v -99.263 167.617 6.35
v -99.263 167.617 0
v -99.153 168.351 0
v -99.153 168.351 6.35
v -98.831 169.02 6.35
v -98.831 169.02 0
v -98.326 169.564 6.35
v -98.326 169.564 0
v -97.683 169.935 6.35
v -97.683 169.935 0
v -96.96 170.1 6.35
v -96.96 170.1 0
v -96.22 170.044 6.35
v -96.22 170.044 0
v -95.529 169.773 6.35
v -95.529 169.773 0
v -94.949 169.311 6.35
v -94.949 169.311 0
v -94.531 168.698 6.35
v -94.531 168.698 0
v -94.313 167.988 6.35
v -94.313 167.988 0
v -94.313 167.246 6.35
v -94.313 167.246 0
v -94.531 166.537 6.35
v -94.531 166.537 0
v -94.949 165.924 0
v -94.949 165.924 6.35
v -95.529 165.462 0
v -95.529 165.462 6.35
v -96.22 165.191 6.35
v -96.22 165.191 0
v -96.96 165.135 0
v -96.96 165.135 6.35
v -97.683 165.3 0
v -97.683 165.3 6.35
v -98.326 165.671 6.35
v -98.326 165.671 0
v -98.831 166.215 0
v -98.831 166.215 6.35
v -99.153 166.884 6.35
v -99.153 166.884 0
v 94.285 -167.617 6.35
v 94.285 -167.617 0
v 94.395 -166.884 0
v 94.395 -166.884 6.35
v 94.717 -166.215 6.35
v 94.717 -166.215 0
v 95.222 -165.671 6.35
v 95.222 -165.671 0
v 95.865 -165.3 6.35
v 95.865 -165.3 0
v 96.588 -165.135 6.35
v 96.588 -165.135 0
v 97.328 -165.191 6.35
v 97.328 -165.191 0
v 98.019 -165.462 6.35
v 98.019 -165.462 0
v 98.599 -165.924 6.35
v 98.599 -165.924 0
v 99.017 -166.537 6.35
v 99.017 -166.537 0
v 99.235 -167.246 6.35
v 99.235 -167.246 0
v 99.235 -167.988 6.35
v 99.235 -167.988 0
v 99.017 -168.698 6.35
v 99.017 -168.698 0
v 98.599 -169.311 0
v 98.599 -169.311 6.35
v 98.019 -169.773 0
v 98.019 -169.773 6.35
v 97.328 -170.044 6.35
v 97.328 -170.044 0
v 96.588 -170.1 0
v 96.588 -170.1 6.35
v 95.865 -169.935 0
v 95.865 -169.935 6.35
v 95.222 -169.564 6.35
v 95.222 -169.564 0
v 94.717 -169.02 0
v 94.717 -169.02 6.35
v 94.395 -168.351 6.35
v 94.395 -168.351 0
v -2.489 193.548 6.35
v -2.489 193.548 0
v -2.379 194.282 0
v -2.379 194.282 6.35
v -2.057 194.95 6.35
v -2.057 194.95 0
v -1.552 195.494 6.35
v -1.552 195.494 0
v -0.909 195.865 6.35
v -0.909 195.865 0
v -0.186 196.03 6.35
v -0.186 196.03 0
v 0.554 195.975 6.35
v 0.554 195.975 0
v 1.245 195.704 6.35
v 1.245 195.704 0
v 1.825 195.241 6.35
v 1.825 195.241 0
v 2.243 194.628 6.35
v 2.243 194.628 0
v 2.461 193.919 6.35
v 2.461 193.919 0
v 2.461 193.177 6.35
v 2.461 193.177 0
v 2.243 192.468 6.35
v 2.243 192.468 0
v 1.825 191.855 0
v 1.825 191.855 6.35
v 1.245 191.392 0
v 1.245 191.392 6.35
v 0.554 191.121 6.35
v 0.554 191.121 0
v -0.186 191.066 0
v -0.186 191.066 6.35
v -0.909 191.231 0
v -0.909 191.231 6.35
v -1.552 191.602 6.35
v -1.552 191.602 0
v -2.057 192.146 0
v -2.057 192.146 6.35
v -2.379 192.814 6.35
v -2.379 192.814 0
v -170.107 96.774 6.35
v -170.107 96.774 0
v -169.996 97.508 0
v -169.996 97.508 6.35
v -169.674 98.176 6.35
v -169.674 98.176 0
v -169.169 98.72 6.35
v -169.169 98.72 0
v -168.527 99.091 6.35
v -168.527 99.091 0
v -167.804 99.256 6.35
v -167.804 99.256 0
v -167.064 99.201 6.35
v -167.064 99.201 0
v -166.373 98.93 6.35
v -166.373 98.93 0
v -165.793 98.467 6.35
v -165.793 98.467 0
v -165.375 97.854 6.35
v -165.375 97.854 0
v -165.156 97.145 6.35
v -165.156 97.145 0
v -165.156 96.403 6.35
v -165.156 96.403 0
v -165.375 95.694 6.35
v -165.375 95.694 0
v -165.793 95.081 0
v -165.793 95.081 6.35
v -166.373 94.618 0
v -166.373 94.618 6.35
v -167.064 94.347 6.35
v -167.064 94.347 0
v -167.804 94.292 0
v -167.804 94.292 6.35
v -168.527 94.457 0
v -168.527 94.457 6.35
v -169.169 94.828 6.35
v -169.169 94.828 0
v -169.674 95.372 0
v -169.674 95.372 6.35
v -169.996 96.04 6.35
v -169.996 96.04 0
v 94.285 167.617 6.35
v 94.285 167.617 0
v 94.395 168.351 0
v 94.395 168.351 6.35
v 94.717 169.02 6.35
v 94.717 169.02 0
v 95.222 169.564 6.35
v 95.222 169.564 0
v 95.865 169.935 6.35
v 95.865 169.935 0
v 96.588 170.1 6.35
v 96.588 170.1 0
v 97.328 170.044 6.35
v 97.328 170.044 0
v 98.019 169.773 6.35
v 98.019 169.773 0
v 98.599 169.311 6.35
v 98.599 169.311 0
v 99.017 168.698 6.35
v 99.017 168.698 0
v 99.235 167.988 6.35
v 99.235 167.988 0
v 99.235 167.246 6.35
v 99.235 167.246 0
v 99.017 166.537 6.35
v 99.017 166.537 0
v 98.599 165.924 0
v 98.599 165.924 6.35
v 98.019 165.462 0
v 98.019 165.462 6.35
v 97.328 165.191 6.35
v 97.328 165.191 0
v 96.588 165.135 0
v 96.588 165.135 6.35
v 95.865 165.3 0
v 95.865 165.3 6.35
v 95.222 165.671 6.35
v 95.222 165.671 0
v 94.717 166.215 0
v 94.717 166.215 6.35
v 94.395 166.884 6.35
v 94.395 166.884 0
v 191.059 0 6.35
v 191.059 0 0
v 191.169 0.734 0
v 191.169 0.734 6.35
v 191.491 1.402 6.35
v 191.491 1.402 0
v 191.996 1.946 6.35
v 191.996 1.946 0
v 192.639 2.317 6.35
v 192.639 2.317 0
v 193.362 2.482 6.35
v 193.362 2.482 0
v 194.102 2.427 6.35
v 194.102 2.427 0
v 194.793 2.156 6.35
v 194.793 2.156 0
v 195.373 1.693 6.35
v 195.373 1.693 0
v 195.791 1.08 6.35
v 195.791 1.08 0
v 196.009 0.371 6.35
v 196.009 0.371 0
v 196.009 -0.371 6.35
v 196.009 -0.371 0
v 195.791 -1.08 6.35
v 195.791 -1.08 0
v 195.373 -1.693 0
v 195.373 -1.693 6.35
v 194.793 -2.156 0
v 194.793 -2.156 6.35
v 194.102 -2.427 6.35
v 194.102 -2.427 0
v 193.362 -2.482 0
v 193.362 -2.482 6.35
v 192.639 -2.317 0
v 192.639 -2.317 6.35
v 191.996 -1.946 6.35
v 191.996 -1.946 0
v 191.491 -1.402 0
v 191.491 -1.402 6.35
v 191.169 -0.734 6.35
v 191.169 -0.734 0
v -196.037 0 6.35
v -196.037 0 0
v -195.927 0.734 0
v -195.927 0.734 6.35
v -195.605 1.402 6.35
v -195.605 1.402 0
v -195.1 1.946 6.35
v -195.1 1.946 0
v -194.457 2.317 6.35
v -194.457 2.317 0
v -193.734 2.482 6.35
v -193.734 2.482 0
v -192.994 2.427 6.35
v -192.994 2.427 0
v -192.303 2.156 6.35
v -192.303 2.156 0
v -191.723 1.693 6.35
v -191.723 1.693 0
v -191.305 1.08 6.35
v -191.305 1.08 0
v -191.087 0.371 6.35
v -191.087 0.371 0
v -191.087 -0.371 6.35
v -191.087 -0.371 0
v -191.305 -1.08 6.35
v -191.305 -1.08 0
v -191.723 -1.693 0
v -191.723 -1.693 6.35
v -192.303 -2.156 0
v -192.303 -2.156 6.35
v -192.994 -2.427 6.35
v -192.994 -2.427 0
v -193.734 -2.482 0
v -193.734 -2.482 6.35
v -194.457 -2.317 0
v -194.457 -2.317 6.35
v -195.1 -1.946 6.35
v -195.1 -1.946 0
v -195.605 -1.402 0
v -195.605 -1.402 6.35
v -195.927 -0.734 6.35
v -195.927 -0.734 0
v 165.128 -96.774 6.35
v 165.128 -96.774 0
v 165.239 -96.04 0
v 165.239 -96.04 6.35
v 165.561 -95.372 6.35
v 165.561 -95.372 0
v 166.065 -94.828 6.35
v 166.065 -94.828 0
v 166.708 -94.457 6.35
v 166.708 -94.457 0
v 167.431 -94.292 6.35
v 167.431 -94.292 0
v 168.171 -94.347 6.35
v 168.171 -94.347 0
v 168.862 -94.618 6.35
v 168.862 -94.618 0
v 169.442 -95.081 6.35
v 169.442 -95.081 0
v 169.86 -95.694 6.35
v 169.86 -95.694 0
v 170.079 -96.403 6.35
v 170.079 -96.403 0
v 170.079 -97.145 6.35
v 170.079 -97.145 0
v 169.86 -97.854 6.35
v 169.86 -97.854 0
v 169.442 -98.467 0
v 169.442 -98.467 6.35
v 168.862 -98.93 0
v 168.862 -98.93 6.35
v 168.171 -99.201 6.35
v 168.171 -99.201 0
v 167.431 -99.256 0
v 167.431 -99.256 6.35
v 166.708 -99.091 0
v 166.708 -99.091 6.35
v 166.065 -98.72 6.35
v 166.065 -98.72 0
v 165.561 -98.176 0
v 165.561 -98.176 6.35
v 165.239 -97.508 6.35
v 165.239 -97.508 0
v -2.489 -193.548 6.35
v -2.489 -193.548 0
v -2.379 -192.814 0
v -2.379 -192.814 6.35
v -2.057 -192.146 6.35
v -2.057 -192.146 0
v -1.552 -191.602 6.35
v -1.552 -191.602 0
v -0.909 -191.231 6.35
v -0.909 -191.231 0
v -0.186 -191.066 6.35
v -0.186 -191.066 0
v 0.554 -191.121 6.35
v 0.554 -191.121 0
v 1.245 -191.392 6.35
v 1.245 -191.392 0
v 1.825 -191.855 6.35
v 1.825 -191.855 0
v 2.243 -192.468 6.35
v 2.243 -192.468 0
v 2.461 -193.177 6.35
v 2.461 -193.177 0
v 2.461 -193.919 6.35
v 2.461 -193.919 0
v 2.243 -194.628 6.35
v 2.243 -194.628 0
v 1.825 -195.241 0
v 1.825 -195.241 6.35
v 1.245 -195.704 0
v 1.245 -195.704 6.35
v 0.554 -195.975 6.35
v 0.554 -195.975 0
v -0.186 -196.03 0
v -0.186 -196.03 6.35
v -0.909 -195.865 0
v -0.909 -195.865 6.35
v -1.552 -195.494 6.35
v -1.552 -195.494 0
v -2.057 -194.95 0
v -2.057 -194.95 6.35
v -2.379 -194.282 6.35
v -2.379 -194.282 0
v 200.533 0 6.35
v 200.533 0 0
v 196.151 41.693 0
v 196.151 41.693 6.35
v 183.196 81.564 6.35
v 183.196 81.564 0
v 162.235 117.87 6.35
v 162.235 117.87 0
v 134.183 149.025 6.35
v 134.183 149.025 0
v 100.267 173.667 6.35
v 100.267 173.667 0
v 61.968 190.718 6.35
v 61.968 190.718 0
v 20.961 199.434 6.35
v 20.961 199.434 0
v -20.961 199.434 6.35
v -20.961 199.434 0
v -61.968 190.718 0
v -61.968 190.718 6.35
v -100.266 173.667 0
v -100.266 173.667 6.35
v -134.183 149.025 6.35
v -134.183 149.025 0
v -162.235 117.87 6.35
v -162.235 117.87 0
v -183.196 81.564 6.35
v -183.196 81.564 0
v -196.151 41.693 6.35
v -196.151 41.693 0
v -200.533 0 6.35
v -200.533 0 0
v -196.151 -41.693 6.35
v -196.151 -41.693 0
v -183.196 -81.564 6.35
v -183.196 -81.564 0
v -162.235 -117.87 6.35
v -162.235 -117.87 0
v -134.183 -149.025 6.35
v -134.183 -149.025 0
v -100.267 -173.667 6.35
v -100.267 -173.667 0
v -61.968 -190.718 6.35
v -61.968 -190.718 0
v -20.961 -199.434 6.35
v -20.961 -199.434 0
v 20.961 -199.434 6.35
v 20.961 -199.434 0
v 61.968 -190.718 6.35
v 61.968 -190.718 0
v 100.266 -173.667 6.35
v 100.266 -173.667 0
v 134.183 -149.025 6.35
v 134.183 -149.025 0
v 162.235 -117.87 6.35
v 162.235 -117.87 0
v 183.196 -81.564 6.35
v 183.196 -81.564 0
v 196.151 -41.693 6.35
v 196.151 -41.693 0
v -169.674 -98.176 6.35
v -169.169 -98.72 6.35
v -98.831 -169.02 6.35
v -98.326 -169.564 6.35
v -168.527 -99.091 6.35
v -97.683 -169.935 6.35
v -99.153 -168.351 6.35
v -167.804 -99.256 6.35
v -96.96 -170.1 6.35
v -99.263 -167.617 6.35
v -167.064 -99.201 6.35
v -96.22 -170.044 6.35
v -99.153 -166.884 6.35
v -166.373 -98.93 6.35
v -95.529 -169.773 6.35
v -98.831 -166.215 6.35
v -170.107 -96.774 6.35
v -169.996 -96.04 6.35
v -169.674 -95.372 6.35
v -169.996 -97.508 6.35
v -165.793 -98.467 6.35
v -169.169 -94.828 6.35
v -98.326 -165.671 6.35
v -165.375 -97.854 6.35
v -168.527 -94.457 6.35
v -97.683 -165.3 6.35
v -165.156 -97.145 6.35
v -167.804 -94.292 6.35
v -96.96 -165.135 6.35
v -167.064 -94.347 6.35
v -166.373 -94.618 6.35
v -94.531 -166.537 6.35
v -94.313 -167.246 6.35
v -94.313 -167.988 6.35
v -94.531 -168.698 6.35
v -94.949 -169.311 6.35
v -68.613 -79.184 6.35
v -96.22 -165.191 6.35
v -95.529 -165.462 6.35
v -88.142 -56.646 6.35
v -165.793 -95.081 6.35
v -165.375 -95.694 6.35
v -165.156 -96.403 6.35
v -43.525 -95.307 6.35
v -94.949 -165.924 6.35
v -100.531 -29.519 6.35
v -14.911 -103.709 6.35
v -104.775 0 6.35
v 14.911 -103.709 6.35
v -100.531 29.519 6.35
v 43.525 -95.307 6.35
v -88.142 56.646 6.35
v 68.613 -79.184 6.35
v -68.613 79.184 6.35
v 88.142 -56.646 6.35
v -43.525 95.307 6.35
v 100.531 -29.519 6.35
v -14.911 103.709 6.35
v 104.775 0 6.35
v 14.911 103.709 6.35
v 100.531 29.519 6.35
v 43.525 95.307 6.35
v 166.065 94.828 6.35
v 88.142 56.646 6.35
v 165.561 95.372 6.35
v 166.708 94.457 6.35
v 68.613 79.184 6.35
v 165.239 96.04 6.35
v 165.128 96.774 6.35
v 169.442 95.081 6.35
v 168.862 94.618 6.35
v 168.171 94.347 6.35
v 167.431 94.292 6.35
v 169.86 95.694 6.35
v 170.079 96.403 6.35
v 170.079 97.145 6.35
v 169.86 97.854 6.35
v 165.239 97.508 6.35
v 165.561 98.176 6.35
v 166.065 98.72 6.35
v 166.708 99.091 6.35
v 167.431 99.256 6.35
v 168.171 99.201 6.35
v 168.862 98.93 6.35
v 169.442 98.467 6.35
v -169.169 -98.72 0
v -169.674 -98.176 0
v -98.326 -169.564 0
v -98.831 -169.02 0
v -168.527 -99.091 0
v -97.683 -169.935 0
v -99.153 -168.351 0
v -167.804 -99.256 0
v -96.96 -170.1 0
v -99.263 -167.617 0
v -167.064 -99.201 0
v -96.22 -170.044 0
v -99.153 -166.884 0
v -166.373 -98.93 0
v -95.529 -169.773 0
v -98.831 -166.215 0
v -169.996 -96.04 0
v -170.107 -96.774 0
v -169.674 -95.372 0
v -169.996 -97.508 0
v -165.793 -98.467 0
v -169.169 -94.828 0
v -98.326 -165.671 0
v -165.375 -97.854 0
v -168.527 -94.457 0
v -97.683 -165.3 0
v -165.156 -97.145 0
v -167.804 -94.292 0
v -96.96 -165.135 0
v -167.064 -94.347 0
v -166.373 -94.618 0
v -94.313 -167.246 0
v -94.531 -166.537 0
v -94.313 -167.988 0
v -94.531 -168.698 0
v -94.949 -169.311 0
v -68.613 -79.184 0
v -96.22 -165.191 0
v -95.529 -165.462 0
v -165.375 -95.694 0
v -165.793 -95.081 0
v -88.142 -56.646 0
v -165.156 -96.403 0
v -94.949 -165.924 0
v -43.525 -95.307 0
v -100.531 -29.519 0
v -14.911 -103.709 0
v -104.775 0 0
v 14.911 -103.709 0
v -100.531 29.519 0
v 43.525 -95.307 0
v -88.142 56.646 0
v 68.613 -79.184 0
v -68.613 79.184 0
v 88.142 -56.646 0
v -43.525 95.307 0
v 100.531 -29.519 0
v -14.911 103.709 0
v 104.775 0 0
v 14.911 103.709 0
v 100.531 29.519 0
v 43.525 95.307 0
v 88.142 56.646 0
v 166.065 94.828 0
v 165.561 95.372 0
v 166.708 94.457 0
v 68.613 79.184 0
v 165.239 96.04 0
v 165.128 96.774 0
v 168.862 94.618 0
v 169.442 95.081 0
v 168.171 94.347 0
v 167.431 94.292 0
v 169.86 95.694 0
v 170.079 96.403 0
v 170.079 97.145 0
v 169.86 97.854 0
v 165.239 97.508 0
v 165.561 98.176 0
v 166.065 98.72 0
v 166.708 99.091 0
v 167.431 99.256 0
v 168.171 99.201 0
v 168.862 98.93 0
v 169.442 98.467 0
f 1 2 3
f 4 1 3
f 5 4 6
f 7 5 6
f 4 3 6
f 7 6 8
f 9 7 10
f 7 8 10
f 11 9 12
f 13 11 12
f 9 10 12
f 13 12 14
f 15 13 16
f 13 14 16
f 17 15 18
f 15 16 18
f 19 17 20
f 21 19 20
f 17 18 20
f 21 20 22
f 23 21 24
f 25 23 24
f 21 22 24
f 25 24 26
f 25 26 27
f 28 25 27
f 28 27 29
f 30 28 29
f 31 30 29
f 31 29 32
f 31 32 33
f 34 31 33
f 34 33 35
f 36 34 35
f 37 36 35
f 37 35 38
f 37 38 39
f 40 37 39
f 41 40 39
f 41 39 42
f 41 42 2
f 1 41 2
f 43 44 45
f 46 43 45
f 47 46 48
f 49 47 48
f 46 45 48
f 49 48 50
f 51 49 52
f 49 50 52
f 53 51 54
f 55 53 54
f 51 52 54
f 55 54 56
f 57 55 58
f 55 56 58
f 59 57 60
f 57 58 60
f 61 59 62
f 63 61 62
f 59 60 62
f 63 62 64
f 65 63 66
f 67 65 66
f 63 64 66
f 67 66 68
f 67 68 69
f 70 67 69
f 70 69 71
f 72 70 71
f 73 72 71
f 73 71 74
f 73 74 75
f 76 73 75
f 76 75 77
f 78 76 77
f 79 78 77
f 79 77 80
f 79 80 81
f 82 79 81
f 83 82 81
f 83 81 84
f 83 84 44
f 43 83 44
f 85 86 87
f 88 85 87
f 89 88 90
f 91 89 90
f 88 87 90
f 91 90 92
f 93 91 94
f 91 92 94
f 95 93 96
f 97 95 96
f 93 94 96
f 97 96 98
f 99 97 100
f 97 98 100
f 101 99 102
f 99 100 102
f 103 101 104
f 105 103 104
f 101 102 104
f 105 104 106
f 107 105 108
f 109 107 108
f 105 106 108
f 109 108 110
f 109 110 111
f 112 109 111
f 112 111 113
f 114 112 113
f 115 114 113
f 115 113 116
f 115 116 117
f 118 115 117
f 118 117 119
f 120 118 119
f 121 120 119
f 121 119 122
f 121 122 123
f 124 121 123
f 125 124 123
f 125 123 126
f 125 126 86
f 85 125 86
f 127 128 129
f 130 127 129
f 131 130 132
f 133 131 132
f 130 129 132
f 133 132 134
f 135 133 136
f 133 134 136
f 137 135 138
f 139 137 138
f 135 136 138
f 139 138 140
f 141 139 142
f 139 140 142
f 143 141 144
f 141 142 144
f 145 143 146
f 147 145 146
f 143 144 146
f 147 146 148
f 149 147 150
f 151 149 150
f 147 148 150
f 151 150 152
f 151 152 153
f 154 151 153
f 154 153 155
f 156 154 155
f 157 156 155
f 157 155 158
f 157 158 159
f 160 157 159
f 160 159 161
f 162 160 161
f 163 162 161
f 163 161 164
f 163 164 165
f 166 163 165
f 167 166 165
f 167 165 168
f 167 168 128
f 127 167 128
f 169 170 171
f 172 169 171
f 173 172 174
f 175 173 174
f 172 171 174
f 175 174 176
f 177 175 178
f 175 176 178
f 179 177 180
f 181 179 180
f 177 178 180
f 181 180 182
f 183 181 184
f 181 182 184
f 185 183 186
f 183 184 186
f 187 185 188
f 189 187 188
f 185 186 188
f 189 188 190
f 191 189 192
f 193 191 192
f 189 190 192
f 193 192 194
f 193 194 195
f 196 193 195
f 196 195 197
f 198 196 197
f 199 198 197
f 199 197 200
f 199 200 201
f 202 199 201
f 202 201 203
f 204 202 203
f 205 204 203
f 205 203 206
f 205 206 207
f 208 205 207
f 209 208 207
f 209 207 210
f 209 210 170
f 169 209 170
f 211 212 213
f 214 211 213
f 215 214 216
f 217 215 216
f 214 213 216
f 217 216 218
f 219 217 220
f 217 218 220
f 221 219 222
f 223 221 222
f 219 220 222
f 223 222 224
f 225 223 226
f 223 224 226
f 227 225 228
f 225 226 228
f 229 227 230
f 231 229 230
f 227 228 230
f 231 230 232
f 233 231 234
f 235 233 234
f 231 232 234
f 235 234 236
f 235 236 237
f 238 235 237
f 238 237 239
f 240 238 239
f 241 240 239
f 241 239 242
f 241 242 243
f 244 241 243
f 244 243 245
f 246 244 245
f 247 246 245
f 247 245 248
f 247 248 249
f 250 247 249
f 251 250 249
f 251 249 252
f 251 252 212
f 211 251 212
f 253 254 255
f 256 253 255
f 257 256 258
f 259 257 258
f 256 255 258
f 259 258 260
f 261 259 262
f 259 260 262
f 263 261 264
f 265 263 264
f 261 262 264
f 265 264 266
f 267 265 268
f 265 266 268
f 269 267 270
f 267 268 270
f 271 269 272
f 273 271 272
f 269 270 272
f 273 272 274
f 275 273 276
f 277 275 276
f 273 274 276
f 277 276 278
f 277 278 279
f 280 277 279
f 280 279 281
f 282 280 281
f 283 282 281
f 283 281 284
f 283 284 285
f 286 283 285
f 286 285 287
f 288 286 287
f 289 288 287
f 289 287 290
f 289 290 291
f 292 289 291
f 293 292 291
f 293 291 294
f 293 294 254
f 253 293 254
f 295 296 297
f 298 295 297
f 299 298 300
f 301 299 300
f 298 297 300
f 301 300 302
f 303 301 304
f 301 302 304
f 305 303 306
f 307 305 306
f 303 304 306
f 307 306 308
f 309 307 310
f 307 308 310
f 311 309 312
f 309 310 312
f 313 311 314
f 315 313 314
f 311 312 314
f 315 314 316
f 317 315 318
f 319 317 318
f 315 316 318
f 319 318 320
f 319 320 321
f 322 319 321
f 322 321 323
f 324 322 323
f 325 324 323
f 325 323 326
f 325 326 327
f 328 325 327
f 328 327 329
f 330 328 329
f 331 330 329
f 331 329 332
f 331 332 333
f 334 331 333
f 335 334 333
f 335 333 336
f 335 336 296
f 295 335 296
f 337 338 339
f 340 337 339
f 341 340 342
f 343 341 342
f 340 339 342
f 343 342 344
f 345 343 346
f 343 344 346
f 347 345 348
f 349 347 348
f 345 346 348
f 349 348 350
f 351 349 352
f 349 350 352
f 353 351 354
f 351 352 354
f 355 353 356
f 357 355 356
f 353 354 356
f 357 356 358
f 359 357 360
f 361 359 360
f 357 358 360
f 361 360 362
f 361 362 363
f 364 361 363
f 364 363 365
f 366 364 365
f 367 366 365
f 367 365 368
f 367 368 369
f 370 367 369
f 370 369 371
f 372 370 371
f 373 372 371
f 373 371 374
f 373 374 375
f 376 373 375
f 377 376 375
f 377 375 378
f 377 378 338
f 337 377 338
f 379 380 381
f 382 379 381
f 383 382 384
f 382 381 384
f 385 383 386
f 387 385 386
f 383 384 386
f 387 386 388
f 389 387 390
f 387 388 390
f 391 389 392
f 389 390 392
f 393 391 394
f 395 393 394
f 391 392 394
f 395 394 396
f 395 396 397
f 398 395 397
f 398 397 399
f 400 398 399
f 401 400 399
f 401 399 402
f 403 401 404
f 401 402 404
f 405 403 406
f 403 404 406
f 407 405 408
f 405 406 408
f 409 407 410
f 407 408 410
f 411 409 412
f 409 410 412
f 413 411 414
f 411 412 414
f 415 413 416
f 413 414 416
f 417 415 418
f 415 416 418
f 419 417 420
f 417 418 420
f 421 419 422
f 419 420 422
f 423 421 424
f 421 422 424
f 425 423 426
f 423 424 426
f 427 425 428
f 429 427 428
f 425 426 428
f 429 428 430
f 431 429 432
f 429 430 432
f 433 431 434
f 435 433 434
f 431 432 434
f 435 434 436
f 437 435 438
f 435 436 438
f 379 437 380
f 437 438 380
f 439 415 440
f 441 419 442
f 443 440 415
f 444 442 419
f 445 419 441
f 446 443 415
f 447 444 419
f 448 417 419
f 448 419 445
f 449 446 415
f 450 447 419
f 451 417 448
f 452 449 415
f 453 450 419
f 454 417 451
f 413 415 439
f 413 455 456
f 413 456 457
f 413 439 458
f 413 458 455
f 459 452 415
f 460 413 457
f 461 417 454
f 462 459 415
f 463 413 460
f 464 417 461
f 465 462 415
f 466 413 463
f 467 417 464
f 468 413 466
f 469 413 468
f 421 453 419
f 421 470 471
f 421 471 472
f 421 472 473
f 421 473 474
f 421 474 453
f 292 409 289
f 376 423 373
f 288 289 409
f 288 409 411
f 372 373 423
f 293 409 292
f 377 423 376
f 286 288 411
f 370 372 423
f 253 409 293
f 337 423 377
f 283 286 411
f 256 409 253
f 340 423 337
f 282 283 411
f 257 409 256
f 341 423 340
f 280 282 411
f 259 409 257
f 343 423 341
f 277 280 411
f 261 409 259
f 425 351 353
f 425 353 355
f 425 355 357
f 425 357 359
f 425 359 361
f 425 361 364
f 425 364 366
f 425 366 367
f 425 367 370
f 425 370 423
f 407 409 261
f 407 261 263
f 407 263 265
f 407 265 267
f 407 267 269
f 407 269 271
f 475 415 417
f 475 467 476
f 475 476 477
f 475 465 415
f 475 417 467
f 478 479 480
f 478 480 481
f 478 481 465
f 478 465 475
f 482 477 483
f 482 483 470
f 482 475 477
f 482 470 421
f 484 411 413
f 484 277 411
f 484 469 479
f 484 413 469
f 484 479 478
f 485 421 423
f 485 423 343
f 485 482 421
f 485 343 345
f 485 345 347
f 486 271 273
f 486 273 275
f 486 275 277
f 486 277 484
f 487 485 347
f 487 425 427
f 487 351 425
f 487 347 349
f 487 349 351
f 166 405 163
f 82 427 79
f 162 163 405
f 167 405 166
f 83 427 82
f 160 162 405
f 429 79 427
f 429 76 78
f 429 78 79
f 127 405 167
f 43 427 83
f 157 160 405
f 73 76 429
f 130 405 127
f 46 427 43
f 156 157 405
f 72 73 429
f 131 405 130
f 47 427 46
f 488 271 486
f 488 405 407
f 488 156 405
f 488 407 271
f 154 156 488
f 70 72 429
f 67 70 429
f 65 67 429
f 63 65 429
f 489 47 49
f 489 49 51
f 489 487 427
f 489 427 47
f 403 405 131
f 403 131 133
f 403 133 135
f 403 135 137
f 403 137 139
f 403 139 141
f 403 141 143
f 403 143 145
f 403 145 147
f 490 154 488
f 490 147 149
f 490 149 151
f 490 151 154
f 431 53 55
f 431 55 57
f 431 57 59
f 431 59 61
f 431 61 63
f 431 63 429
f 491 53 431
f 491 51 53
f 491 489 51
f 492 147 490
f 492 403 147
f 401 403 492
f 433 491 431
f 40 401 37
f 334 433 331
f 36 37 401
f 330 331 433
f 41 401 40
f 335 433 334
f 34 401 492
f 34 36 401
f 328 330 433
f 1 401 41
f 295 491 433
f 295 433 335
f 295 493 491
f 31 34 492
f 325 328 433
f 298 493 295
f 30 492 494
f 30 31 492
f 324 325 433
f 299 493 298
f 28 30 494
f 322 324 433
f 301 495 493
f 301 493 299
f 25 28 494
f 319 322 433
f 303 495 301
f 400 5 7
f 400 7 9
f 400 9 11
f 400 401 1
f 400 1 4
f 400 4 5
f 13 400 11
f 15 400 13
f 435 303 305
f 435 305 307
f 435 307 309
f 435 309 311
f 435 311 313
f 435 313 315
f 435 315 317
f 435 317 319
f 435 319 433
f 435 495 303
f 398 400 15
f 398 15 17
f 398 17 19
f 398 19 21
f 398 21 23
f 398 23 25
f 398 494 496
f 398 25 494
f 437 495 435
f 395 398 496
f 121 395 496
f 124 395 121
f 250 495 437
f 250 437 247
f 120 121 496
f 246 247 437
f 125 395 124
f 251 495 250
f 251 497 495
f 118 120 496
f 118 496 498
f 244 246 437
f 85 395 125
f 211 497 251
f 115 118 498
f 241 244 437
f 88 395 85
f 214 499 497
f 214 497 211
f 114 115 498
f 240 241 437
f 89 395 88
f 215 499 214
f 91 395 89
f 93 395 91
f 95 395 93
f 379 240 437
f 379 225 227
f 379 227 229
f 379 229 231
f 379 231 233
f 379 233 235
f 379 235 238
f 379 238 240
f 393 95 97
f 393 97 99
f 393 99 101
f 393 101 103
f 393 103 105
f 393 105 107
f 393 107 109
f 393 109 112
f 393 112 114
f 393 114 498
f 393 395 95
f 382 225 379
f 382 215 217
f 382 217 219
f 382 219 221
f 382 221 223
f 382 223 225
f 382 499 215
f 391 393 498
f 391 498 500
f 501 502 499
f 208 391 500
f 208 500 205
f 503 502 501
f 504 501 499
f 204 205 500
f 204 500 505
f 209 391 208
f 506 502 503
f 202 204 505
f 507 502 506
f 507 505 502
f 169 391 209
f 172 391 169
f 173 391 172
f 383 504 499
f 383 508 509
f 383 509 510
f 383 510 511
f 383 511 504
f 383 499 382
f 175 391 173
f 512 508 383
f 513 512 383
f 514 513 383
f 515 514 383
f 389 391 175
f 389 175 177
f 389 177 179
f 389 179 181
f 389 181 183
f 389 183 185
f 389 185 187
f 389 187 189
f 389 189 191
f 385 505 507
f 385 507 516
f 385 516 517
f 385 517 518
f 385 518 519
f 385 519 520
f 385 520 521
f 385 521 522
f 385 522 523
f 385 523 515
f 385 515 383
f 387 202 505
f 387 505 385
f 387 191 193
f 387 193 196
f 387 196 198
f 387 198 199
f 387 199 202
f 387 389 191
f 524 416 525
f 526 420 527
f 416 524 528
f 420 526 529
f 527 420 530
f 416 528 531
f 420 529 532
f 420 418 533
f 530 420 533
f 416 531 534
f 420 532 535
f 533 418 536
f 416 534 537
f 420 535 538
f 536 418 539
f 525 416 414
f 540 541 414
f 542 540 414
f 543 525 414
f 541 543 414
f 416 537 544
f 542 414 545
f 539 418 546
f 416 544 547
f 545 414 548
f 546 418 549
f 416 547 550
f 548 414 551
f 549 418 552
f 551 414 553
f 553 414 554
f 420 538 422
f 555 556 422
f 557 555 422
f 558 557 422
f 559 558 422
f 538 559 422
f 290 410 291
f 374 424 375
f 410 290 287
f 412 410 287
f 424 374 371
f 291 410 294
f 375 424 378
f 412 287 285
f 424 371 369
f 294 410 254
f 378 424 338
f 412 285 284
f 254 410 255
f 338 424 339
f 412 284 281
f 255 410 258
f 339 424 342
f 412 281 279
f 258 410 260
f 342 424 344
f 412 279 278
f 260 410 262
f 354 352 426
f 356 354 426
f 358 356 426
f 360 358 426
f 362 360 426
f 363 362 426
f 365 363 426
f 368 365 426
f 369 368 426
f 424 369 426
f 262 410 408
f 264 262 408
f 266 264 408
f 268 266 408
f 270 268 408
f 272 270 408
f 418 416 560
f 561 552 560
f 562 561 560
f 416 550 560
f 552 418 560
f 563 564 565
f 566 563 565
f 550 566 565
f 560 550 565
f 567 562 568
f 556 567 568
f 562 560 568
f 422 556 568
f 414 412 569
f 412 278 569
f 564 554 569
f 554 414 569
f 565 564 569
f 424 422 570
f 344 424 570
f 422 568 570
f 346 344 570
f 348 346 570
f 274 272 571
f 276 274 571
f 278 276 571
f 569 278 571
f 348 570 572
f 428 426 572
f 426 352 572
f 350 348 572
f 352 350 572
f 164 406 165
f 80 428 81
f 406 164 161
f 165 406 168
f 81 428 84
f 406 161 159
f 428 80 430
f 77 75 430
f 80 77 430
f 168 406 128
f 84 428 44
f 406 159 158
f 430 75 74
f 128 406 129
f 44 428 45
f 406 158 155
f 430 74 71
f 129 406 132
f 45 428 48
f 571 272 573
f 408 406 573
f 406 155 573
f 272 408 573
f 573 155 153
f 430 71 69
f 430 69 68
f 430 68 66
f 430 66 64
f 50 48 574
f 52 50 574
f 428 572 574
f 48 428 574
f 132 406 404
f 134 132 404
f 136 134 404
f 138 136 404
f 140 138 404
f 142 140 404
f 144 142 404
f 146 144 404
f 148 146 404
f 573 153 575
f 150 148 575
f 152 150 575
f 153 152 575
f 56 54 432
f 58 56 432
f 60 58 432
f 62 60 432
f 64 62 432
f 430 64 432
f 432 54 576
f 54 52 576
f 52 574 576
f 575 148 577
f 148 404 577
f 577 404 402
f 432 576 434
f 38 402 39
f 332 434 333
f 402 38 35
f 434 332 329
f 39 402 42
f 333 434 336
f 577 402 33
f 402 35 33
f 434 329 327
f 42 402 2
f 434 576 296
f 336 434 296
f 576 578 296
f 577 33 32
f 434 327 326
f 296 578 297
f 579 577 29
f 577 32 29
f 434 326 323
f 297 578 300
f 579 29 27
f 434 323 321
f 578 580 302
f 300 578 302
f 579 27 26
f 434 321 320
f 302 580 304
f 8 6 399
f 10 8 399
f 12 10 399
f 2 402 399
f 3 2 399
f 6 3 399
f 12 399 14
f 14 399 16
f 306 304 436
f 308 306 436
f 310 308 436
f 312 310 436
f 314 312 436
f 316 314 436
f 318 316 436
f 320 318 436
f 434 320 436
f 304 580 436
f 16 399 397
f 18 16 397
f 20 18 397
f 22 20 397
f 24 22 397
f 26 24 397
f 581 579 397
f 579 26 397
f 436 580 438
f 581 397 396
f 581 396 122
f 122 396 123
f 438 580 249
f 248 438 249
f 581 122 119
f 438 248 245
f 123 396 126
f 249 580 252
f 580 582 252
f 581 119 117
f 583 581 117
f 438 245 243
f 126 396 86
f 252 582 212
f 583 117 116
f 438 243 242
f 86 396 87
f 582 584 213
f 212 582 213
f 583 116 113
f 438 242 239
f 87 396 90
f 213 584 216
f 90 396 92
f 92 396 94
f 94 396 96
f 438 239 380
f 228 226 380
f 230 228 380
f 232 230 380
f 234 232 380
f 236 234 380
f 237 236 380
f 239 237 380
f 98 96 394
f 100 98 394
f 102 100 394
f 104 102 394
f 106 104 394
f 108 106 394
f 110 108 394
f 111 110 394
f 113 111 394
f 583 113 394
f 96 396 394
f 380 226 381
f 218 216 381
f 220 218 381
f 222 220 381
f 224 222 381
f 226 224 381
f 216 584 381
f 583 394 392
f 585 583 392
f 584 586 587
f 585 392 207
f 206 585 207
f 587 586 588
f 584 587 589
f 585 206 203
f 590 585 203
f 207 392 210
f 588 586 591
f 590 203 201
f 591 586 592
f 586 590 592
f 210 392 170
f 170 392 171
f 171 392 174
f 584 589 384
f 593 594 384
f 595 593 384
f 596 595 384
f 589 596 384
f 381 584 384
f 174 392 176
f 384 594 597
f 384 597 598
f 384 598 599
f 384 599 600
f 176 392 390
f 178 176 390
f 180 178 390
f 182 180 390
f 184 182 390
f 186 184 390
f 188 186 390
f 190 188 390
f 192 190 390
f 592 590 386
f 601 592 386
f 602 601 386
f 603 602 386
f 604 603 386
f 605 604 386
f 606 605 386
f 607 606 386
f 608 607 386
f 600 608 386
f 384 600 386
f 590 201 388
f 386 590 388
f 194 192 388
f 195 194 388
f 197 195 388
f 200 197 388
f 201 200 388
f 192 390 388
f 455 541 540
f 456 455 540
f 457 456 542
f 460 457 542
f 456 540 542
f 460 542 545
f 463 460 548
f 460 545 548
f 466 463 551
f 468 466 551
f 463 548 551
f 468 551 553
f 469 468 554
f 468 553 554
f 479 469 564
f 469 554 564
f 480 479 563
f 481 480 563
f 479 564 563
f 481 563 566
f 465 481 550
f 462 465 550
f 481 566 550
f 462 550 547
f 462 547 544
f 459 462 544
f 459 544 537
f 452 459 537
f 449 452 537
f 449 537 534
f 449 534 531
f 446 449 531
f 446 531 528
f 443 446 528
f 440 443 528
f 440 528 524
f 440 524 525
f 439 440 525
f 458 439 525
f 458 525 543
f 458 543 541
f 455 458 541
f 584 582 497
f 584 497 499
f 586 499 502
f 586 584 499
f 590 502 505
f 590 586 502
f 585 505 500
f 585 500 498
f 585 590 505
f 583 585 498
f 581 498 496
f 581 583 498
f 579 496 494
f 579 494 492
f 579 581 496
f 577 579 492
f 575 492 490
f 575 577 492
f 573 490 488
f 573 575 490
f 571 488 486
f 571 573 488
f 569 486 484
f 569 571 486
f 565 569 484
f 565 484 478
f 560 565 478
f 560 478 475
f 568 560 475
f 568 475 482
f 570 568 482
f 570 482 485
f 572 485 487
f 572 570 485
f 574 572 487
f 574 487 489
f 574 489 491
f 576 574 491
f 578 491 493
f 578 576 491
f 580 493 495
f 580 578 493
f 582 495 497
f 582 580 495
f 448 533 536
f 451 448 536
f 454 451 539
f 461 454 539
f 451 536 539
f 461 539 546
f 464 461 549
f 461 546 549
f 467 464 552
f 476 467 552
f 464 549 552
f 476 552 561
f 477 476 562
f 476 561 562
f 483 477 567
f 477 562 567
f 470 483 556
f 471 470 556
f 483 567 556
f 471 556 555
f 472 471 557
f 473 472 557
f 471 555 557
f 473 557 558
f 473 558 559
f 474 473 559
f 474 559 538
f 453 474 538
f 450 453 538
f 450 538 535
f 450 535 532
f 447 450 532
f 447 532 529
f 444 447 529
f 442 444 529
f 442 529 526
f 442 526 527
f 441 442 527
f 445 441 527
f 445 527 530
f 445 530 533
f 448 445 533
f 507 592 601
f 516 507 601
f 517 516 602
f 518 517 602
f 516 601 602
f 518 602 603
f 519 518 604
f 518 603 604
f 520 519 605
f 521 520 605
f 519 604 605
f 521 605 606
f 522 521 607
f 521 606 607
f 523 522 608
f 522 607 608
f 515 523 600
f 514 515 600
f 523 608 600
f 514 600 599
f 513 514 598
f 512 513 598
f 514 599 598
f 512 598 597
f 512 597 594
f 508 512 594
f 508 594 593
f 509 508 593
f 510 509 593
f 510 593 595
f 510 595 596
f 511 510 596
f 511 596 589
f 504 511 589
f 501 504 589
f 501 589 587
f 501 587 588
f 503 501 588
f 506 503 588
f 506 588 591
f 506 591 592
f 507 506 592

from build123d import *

# Parameters (mm, degrees)
SKETCH1_R                  = 200.533
SKETCH1_R_2                = 104.775
BOSS_EXTRUDE1_DEPTH        = 6.35
F_9_0_196_DIAMETER_HOLE1_D = 4.9784


with BuildPart() as part:
    # Sketch1 → Boss-Extrude1 (new body)
    with BuildSketch(Plane(origin=(0, 0, 0), x_dir=(0, 1, 0), z_dir=(0, 0, 1))):
        with Locations(Location((0, 0, 0), (0, 0, 270))):
            Circle(SKETCH1_R)
        with Locations(Location((0, 0, 0), (0, 0, 270))):
            Circle(SKETCH1_R_2, mode=Mode.SUBTRACT)
    extrude(amount=BOSS_EXTRUDE1_DEPTH)

    # #9 (0.196) Diameter Hole1 (through all)
    with Locations(Plane.XY.offset(6.35)):
        with Locations((-96.774, 167.617484852), (-167.617484852, 96.774), (-193.548, 0), (-167.617484852, -96.774), (-96.774, -167.617484852), (0, -193.548), (96.774, -167.617484852), (167.617484852, -96.774), (193.548, 0), (167.617484852, 96.774), (96.774, 167.617484852), (0, 193.548)):
            Hole(F_9_0_196_DIAMETER_HOLE1_D / 2)


solid = part.part
